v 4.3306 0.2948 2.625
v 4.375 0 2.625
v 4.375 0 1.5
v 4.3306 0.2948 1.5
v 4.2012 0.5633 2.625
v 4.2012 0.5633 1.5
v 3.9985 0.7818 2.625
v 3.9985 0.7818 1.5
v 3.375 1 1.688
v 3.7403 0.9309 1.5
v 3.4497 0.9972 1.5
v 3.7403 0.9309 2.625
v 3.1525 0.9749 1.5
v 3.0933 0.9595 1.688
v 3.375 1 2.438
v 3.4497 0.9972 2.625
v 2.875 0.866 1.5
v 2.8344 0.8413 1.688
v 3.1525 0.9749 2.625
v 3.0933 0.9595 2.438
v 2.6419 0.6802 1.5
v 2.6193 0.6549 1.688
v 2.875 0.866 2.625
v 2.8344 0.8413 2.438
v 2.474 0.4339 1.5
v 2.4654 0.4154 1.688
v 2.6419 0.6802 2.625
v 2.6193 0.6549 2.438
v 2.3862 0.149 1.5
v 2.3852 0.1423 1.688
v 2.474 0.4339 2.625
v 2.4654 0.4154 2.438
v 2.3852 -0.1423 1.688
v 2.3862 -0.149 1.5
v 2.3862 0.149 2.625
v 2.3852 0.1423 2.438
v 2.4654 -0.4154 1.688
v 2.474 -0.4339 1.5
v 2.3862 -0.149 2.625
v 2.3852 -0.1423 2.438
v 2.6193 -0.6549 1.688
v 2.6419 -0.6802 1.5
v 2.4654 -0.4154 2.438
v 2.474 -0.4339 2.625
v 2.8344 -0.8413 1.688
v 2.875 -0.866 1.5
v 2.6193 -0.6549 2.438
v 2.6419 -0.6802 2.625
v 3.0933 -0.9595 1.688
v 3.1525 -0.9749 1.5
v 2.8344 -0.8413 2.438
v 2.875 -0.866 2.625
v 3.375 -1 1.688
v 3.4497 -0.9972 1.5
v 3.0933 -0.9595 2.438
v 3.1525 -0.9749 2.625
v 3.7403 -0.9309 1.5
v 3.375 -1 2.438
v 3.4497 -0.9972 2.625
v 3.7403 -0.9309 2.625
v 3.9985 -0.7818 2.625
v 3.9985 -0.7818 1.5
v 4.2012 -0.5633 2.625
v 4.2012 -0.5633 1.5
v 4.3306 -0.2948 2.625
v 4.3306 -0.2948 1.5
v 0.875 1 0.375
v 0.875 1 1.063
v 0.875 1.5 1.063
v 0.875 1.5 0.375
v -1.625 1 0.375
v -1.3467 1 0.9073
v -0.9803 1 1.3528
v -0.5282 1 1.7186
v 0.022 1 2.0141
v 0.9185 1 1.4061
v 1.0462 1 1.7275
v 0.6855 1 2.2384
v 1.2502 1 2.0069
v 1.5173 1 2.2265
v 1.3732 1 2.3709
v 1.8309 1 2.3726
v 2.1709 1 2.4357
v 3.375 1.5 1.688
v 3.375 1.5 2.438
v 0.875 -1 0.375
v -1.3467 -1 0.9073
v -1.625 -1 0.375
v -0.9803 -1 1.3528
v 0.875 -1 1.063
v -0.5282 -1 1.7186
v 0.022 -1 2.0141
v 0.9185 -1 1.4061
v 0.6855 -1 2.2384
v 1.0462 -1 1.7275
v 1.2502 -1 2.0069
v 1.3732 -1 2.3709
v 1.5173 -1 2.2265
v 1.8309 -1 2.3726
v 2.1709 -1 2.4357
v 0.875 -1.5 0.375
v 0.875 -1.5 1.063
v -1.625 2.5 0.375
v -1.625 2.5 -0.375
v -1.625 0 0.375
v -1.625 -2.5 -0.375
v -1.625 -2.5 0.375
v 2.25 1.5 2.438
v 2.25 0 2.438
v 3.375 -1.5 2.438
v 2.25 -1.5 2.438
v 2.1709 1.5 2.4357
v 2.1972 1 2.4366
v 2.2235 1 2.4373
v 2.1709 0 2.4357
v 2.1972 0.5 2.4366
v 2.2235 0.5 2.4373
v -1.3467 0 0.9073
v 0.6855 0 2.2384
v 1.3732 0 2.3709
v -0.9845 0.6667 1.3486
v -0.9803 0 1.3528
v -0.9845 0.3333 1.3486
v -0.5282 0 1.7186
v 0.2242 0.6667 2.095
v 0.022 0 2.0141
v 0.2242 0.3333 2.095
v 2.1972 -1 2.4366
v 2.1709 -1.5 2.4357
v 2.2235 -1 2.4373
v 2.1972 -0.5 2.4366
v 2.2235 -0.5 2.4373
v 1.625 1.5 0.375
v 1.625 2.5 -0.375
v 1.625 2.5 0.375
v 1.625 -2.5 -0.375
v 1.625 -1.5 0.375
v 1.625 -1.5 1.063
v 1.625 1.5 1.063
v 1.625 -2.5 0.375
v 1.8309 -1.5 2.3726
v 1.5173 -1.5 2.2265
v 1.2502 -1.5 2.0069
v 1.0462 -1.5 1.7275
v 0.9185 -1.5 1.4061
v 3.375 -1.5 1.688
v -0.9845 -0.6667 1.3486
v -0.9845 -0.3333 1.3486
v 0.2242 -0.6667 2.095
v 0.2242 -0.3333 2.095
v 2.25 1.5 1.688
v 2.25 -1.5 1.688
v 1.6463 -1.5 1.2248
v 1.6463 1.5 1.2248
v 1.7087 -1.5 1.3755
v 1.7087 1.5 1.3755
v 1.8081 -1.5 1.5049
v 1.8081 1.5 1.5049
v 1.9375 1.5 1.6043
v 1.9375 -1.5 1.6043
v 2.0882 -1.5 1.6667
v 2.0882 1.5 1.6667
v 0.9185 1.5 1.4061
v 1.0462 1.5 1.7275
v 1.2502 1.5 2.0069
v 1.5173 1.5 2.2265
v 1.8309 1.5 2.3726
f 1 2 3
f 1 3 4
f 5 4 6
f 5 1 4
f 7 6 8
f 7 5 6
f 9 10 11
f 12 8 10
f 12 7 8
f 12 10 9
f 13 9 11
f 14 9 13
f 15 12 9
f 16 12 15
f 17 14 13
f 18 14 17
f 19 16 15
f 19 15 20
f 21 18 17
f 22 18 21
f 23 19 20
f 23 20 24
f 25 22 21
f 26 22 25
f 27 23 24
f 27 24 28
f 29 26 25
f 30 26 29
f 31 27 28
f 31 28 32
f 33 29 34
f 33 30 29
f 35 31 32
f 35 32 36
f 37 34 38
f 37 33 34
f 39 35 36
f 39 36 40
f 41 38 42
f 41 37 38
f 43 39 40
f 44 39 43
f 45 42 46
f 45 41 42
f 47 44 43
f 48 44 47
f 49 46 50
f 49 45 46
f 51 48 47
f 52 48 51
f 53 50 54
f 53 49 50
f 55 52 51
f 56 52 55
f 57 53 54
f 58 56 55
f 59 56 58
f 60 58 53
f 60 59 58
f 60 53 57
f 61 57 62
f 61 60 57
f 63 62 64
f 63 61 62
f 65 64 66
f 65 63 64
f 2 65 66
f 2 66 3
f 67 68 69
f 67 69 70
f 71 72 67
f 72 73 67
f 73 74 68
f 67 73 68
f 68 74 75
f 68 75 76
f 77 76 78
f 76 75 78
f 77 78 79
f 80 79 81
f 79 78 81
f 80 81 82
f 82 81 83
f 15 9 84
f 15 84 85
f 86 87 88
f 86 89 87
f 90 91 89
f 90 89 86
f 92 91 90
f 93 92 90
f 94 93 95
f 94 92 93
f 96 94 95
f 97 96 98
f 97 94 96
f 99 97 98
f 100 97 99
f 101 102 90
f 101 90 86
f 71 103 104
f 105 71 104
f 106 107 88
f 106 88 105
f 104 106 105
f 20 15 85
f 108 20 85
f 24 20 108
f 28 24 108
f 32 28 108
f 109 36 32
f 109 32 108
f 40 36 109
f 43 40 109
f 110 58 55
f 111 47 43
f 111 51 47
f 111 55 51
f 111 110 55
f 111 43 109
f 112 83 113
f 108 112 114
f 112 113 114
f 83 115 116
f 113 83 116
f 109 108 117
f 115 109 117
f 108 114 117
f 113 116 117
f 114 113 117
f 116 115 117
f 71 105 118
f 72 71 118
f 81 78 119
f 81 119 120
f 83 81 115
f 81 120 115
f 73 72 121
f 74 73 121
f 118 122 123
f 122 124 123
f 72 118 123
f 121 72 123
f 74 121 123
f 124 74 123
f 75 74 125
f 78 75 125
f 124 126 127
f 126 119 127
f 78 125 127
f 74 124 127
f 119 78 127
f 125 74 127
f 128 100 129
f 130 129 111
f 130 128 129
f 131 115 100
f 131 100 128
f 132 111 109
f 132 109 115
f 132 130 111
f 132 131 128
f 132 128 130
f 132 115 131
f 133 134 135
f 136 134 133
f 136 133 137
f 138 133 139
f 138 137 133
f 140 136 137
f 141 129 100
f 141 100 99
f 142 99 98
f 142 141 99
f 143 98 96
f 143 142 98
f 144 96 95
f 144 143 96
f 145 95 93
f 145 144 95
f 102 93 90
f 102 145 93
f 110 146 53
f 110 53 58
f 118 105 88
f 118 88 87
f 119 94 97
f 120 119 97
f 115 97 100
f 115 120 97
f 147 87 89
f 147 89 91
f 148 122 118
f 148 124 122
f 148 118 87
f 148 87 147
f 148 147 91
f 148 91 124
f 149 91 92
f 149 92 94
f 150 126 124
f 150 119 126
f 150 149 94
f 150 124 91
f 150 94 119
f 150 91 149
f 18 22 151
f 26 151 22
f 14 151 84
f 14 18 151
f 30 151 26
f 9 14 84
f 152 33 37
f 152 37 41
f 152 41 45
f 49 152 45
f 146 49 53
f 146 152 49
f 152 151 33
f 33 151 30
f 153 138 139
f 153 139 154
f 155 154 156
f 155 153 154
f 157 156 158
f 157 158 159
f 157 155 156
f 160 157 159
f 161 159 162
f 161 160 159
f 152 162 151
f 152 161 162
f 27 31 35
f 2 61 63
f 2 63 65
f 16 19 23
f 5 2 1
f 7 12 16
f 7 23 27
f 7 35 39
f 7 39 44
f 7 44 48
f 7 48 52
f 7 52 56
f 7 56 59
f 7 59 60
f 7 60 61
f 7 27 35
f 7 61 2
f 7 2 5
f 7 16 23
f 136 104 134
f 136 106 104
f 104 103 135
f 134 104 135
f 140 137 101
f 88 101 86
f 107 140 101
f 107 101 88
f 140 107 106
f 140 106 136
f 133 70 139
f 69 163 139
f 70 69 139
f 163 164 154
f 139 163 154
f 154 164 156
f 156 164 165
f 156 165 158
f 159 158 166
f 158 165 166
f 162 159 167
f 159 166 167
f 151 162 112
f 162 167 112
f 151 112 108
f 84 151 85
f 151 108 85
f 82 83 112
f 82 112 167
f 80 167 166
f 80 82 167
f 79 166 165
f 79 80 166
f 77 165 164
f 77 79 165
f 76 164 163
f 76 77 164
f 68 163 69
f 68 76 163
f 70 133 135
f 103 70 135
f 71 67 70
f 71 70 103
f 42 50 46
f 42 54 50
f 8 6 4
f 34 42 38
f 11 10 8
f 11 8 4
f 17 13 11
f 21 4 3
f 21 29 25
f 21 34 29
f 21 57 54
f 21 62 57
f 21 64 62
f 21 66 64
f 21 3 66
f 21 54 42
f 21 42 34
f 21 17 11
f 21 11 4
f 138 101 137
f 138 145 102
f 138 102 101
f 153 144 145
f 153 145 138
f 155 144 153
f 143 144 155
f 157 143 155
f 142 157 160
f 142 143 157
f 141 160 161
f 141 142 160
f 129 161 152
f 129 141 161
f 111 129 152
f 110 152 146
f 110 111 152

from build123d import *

# Parameters (mm, degrees)
F1_DEPTH = 2.5
F0_W     = 1
F0_H     = 0.75
F2_DEPTH = 1.5
F3_DEPTH = 1


with BuildPart() as f1:
    # F0 (on Front) → F1 (new body, symmetric)
    with BuildSketch(Plane.XZ):
        Polygon((1.625, -0.375), (1.625, 0.375), (0.875, 0.375), (-1.625, 0.375), (-1.625, -0.375), align=None)
    extrude(amount=F1_DEPTH, both=True)

    # F0 (on Front) → F2 (join, symmetric)
    with BuildSketch(Plane.XZ):
        with BuildLine():
            Line((0.875, 0.375), (1.625, 0.375))
            Line((1.625, 0.375), (1.625, 1.063))
            ThreePointArc((1.625, 1.063), (1.8080582618, 1.5049417382), (2.25, 1.688))
            Line((2.25, 1.688), (2.375, 1.688))
            Line((2.375, 1.688), (2.375, 2.438))
            Line((2.375, 2.438), (2.25, 2.438))
            add(Edge.make_bspline(
                [(2.170906051, 2.4357232595), (2.1971042738, 2.4365893648), (2.2234685803, 2.4373486386), (2.25, 2.438)],
                knots=[4.3419944686, 4.3419944686, 4.3419944686, 4.3419944686, 4.3899423686, 4.3899423686, 4.3899423686, 4.3899423686], degree=3))
            ThreePointArc((2.170906051, 2.4357232595), (1.2501552171, 2.0068937493), (0.875, 1.063))
            Line((0.875, 1.063), (0.875, 0.375))
        make_face()
        with Locations((2.875, 2.063)):
            Rectangle(F0_W, F0_H)
    extrude(amount=F2_DEPTH, both=True)

    # F0 (on Front) → F3 (join, symmetric)
    with BuildSketch(Plane.XZ):
        with BuildLine():
            Line((-1.625, 0.375), (0.875, 0.375))
            Line((0.875, 0.375), (0.875, 1.063))
            ThreePointArc((0.875, 1.063), (1.2501552171, 2.0068937493), (2.170906051, 2.4357232595))
            add(Edge.make_bspline(
                [(-1.625, 0.375), (-1.2119672171, 1.4027909671), (-0.2015135657, 2.3572917876), (2.170906051, 2.4357232595)],
                knots=[0, 0, 0, 0, 4.3419944686, 4.3419944686, 4.3419944686, 4.3419944686], degree=3))
        make_face()
    extrude(amount=F3_DEPTH, both=True)

    # F0 (on Front) → F4 (revolve)
    with BuildSketch(Plane.XZ):
        Polygon((3.375, 2.438), (3.375, 1.688), (3.375, 1.5), (4.375, 1.5), (4.375, 2.625), (3.375, 2.625), align=None)
    revolve(axis=Axis((3.375, 0, 2.0625), (0, 0, 1)))


solid = f1.part
